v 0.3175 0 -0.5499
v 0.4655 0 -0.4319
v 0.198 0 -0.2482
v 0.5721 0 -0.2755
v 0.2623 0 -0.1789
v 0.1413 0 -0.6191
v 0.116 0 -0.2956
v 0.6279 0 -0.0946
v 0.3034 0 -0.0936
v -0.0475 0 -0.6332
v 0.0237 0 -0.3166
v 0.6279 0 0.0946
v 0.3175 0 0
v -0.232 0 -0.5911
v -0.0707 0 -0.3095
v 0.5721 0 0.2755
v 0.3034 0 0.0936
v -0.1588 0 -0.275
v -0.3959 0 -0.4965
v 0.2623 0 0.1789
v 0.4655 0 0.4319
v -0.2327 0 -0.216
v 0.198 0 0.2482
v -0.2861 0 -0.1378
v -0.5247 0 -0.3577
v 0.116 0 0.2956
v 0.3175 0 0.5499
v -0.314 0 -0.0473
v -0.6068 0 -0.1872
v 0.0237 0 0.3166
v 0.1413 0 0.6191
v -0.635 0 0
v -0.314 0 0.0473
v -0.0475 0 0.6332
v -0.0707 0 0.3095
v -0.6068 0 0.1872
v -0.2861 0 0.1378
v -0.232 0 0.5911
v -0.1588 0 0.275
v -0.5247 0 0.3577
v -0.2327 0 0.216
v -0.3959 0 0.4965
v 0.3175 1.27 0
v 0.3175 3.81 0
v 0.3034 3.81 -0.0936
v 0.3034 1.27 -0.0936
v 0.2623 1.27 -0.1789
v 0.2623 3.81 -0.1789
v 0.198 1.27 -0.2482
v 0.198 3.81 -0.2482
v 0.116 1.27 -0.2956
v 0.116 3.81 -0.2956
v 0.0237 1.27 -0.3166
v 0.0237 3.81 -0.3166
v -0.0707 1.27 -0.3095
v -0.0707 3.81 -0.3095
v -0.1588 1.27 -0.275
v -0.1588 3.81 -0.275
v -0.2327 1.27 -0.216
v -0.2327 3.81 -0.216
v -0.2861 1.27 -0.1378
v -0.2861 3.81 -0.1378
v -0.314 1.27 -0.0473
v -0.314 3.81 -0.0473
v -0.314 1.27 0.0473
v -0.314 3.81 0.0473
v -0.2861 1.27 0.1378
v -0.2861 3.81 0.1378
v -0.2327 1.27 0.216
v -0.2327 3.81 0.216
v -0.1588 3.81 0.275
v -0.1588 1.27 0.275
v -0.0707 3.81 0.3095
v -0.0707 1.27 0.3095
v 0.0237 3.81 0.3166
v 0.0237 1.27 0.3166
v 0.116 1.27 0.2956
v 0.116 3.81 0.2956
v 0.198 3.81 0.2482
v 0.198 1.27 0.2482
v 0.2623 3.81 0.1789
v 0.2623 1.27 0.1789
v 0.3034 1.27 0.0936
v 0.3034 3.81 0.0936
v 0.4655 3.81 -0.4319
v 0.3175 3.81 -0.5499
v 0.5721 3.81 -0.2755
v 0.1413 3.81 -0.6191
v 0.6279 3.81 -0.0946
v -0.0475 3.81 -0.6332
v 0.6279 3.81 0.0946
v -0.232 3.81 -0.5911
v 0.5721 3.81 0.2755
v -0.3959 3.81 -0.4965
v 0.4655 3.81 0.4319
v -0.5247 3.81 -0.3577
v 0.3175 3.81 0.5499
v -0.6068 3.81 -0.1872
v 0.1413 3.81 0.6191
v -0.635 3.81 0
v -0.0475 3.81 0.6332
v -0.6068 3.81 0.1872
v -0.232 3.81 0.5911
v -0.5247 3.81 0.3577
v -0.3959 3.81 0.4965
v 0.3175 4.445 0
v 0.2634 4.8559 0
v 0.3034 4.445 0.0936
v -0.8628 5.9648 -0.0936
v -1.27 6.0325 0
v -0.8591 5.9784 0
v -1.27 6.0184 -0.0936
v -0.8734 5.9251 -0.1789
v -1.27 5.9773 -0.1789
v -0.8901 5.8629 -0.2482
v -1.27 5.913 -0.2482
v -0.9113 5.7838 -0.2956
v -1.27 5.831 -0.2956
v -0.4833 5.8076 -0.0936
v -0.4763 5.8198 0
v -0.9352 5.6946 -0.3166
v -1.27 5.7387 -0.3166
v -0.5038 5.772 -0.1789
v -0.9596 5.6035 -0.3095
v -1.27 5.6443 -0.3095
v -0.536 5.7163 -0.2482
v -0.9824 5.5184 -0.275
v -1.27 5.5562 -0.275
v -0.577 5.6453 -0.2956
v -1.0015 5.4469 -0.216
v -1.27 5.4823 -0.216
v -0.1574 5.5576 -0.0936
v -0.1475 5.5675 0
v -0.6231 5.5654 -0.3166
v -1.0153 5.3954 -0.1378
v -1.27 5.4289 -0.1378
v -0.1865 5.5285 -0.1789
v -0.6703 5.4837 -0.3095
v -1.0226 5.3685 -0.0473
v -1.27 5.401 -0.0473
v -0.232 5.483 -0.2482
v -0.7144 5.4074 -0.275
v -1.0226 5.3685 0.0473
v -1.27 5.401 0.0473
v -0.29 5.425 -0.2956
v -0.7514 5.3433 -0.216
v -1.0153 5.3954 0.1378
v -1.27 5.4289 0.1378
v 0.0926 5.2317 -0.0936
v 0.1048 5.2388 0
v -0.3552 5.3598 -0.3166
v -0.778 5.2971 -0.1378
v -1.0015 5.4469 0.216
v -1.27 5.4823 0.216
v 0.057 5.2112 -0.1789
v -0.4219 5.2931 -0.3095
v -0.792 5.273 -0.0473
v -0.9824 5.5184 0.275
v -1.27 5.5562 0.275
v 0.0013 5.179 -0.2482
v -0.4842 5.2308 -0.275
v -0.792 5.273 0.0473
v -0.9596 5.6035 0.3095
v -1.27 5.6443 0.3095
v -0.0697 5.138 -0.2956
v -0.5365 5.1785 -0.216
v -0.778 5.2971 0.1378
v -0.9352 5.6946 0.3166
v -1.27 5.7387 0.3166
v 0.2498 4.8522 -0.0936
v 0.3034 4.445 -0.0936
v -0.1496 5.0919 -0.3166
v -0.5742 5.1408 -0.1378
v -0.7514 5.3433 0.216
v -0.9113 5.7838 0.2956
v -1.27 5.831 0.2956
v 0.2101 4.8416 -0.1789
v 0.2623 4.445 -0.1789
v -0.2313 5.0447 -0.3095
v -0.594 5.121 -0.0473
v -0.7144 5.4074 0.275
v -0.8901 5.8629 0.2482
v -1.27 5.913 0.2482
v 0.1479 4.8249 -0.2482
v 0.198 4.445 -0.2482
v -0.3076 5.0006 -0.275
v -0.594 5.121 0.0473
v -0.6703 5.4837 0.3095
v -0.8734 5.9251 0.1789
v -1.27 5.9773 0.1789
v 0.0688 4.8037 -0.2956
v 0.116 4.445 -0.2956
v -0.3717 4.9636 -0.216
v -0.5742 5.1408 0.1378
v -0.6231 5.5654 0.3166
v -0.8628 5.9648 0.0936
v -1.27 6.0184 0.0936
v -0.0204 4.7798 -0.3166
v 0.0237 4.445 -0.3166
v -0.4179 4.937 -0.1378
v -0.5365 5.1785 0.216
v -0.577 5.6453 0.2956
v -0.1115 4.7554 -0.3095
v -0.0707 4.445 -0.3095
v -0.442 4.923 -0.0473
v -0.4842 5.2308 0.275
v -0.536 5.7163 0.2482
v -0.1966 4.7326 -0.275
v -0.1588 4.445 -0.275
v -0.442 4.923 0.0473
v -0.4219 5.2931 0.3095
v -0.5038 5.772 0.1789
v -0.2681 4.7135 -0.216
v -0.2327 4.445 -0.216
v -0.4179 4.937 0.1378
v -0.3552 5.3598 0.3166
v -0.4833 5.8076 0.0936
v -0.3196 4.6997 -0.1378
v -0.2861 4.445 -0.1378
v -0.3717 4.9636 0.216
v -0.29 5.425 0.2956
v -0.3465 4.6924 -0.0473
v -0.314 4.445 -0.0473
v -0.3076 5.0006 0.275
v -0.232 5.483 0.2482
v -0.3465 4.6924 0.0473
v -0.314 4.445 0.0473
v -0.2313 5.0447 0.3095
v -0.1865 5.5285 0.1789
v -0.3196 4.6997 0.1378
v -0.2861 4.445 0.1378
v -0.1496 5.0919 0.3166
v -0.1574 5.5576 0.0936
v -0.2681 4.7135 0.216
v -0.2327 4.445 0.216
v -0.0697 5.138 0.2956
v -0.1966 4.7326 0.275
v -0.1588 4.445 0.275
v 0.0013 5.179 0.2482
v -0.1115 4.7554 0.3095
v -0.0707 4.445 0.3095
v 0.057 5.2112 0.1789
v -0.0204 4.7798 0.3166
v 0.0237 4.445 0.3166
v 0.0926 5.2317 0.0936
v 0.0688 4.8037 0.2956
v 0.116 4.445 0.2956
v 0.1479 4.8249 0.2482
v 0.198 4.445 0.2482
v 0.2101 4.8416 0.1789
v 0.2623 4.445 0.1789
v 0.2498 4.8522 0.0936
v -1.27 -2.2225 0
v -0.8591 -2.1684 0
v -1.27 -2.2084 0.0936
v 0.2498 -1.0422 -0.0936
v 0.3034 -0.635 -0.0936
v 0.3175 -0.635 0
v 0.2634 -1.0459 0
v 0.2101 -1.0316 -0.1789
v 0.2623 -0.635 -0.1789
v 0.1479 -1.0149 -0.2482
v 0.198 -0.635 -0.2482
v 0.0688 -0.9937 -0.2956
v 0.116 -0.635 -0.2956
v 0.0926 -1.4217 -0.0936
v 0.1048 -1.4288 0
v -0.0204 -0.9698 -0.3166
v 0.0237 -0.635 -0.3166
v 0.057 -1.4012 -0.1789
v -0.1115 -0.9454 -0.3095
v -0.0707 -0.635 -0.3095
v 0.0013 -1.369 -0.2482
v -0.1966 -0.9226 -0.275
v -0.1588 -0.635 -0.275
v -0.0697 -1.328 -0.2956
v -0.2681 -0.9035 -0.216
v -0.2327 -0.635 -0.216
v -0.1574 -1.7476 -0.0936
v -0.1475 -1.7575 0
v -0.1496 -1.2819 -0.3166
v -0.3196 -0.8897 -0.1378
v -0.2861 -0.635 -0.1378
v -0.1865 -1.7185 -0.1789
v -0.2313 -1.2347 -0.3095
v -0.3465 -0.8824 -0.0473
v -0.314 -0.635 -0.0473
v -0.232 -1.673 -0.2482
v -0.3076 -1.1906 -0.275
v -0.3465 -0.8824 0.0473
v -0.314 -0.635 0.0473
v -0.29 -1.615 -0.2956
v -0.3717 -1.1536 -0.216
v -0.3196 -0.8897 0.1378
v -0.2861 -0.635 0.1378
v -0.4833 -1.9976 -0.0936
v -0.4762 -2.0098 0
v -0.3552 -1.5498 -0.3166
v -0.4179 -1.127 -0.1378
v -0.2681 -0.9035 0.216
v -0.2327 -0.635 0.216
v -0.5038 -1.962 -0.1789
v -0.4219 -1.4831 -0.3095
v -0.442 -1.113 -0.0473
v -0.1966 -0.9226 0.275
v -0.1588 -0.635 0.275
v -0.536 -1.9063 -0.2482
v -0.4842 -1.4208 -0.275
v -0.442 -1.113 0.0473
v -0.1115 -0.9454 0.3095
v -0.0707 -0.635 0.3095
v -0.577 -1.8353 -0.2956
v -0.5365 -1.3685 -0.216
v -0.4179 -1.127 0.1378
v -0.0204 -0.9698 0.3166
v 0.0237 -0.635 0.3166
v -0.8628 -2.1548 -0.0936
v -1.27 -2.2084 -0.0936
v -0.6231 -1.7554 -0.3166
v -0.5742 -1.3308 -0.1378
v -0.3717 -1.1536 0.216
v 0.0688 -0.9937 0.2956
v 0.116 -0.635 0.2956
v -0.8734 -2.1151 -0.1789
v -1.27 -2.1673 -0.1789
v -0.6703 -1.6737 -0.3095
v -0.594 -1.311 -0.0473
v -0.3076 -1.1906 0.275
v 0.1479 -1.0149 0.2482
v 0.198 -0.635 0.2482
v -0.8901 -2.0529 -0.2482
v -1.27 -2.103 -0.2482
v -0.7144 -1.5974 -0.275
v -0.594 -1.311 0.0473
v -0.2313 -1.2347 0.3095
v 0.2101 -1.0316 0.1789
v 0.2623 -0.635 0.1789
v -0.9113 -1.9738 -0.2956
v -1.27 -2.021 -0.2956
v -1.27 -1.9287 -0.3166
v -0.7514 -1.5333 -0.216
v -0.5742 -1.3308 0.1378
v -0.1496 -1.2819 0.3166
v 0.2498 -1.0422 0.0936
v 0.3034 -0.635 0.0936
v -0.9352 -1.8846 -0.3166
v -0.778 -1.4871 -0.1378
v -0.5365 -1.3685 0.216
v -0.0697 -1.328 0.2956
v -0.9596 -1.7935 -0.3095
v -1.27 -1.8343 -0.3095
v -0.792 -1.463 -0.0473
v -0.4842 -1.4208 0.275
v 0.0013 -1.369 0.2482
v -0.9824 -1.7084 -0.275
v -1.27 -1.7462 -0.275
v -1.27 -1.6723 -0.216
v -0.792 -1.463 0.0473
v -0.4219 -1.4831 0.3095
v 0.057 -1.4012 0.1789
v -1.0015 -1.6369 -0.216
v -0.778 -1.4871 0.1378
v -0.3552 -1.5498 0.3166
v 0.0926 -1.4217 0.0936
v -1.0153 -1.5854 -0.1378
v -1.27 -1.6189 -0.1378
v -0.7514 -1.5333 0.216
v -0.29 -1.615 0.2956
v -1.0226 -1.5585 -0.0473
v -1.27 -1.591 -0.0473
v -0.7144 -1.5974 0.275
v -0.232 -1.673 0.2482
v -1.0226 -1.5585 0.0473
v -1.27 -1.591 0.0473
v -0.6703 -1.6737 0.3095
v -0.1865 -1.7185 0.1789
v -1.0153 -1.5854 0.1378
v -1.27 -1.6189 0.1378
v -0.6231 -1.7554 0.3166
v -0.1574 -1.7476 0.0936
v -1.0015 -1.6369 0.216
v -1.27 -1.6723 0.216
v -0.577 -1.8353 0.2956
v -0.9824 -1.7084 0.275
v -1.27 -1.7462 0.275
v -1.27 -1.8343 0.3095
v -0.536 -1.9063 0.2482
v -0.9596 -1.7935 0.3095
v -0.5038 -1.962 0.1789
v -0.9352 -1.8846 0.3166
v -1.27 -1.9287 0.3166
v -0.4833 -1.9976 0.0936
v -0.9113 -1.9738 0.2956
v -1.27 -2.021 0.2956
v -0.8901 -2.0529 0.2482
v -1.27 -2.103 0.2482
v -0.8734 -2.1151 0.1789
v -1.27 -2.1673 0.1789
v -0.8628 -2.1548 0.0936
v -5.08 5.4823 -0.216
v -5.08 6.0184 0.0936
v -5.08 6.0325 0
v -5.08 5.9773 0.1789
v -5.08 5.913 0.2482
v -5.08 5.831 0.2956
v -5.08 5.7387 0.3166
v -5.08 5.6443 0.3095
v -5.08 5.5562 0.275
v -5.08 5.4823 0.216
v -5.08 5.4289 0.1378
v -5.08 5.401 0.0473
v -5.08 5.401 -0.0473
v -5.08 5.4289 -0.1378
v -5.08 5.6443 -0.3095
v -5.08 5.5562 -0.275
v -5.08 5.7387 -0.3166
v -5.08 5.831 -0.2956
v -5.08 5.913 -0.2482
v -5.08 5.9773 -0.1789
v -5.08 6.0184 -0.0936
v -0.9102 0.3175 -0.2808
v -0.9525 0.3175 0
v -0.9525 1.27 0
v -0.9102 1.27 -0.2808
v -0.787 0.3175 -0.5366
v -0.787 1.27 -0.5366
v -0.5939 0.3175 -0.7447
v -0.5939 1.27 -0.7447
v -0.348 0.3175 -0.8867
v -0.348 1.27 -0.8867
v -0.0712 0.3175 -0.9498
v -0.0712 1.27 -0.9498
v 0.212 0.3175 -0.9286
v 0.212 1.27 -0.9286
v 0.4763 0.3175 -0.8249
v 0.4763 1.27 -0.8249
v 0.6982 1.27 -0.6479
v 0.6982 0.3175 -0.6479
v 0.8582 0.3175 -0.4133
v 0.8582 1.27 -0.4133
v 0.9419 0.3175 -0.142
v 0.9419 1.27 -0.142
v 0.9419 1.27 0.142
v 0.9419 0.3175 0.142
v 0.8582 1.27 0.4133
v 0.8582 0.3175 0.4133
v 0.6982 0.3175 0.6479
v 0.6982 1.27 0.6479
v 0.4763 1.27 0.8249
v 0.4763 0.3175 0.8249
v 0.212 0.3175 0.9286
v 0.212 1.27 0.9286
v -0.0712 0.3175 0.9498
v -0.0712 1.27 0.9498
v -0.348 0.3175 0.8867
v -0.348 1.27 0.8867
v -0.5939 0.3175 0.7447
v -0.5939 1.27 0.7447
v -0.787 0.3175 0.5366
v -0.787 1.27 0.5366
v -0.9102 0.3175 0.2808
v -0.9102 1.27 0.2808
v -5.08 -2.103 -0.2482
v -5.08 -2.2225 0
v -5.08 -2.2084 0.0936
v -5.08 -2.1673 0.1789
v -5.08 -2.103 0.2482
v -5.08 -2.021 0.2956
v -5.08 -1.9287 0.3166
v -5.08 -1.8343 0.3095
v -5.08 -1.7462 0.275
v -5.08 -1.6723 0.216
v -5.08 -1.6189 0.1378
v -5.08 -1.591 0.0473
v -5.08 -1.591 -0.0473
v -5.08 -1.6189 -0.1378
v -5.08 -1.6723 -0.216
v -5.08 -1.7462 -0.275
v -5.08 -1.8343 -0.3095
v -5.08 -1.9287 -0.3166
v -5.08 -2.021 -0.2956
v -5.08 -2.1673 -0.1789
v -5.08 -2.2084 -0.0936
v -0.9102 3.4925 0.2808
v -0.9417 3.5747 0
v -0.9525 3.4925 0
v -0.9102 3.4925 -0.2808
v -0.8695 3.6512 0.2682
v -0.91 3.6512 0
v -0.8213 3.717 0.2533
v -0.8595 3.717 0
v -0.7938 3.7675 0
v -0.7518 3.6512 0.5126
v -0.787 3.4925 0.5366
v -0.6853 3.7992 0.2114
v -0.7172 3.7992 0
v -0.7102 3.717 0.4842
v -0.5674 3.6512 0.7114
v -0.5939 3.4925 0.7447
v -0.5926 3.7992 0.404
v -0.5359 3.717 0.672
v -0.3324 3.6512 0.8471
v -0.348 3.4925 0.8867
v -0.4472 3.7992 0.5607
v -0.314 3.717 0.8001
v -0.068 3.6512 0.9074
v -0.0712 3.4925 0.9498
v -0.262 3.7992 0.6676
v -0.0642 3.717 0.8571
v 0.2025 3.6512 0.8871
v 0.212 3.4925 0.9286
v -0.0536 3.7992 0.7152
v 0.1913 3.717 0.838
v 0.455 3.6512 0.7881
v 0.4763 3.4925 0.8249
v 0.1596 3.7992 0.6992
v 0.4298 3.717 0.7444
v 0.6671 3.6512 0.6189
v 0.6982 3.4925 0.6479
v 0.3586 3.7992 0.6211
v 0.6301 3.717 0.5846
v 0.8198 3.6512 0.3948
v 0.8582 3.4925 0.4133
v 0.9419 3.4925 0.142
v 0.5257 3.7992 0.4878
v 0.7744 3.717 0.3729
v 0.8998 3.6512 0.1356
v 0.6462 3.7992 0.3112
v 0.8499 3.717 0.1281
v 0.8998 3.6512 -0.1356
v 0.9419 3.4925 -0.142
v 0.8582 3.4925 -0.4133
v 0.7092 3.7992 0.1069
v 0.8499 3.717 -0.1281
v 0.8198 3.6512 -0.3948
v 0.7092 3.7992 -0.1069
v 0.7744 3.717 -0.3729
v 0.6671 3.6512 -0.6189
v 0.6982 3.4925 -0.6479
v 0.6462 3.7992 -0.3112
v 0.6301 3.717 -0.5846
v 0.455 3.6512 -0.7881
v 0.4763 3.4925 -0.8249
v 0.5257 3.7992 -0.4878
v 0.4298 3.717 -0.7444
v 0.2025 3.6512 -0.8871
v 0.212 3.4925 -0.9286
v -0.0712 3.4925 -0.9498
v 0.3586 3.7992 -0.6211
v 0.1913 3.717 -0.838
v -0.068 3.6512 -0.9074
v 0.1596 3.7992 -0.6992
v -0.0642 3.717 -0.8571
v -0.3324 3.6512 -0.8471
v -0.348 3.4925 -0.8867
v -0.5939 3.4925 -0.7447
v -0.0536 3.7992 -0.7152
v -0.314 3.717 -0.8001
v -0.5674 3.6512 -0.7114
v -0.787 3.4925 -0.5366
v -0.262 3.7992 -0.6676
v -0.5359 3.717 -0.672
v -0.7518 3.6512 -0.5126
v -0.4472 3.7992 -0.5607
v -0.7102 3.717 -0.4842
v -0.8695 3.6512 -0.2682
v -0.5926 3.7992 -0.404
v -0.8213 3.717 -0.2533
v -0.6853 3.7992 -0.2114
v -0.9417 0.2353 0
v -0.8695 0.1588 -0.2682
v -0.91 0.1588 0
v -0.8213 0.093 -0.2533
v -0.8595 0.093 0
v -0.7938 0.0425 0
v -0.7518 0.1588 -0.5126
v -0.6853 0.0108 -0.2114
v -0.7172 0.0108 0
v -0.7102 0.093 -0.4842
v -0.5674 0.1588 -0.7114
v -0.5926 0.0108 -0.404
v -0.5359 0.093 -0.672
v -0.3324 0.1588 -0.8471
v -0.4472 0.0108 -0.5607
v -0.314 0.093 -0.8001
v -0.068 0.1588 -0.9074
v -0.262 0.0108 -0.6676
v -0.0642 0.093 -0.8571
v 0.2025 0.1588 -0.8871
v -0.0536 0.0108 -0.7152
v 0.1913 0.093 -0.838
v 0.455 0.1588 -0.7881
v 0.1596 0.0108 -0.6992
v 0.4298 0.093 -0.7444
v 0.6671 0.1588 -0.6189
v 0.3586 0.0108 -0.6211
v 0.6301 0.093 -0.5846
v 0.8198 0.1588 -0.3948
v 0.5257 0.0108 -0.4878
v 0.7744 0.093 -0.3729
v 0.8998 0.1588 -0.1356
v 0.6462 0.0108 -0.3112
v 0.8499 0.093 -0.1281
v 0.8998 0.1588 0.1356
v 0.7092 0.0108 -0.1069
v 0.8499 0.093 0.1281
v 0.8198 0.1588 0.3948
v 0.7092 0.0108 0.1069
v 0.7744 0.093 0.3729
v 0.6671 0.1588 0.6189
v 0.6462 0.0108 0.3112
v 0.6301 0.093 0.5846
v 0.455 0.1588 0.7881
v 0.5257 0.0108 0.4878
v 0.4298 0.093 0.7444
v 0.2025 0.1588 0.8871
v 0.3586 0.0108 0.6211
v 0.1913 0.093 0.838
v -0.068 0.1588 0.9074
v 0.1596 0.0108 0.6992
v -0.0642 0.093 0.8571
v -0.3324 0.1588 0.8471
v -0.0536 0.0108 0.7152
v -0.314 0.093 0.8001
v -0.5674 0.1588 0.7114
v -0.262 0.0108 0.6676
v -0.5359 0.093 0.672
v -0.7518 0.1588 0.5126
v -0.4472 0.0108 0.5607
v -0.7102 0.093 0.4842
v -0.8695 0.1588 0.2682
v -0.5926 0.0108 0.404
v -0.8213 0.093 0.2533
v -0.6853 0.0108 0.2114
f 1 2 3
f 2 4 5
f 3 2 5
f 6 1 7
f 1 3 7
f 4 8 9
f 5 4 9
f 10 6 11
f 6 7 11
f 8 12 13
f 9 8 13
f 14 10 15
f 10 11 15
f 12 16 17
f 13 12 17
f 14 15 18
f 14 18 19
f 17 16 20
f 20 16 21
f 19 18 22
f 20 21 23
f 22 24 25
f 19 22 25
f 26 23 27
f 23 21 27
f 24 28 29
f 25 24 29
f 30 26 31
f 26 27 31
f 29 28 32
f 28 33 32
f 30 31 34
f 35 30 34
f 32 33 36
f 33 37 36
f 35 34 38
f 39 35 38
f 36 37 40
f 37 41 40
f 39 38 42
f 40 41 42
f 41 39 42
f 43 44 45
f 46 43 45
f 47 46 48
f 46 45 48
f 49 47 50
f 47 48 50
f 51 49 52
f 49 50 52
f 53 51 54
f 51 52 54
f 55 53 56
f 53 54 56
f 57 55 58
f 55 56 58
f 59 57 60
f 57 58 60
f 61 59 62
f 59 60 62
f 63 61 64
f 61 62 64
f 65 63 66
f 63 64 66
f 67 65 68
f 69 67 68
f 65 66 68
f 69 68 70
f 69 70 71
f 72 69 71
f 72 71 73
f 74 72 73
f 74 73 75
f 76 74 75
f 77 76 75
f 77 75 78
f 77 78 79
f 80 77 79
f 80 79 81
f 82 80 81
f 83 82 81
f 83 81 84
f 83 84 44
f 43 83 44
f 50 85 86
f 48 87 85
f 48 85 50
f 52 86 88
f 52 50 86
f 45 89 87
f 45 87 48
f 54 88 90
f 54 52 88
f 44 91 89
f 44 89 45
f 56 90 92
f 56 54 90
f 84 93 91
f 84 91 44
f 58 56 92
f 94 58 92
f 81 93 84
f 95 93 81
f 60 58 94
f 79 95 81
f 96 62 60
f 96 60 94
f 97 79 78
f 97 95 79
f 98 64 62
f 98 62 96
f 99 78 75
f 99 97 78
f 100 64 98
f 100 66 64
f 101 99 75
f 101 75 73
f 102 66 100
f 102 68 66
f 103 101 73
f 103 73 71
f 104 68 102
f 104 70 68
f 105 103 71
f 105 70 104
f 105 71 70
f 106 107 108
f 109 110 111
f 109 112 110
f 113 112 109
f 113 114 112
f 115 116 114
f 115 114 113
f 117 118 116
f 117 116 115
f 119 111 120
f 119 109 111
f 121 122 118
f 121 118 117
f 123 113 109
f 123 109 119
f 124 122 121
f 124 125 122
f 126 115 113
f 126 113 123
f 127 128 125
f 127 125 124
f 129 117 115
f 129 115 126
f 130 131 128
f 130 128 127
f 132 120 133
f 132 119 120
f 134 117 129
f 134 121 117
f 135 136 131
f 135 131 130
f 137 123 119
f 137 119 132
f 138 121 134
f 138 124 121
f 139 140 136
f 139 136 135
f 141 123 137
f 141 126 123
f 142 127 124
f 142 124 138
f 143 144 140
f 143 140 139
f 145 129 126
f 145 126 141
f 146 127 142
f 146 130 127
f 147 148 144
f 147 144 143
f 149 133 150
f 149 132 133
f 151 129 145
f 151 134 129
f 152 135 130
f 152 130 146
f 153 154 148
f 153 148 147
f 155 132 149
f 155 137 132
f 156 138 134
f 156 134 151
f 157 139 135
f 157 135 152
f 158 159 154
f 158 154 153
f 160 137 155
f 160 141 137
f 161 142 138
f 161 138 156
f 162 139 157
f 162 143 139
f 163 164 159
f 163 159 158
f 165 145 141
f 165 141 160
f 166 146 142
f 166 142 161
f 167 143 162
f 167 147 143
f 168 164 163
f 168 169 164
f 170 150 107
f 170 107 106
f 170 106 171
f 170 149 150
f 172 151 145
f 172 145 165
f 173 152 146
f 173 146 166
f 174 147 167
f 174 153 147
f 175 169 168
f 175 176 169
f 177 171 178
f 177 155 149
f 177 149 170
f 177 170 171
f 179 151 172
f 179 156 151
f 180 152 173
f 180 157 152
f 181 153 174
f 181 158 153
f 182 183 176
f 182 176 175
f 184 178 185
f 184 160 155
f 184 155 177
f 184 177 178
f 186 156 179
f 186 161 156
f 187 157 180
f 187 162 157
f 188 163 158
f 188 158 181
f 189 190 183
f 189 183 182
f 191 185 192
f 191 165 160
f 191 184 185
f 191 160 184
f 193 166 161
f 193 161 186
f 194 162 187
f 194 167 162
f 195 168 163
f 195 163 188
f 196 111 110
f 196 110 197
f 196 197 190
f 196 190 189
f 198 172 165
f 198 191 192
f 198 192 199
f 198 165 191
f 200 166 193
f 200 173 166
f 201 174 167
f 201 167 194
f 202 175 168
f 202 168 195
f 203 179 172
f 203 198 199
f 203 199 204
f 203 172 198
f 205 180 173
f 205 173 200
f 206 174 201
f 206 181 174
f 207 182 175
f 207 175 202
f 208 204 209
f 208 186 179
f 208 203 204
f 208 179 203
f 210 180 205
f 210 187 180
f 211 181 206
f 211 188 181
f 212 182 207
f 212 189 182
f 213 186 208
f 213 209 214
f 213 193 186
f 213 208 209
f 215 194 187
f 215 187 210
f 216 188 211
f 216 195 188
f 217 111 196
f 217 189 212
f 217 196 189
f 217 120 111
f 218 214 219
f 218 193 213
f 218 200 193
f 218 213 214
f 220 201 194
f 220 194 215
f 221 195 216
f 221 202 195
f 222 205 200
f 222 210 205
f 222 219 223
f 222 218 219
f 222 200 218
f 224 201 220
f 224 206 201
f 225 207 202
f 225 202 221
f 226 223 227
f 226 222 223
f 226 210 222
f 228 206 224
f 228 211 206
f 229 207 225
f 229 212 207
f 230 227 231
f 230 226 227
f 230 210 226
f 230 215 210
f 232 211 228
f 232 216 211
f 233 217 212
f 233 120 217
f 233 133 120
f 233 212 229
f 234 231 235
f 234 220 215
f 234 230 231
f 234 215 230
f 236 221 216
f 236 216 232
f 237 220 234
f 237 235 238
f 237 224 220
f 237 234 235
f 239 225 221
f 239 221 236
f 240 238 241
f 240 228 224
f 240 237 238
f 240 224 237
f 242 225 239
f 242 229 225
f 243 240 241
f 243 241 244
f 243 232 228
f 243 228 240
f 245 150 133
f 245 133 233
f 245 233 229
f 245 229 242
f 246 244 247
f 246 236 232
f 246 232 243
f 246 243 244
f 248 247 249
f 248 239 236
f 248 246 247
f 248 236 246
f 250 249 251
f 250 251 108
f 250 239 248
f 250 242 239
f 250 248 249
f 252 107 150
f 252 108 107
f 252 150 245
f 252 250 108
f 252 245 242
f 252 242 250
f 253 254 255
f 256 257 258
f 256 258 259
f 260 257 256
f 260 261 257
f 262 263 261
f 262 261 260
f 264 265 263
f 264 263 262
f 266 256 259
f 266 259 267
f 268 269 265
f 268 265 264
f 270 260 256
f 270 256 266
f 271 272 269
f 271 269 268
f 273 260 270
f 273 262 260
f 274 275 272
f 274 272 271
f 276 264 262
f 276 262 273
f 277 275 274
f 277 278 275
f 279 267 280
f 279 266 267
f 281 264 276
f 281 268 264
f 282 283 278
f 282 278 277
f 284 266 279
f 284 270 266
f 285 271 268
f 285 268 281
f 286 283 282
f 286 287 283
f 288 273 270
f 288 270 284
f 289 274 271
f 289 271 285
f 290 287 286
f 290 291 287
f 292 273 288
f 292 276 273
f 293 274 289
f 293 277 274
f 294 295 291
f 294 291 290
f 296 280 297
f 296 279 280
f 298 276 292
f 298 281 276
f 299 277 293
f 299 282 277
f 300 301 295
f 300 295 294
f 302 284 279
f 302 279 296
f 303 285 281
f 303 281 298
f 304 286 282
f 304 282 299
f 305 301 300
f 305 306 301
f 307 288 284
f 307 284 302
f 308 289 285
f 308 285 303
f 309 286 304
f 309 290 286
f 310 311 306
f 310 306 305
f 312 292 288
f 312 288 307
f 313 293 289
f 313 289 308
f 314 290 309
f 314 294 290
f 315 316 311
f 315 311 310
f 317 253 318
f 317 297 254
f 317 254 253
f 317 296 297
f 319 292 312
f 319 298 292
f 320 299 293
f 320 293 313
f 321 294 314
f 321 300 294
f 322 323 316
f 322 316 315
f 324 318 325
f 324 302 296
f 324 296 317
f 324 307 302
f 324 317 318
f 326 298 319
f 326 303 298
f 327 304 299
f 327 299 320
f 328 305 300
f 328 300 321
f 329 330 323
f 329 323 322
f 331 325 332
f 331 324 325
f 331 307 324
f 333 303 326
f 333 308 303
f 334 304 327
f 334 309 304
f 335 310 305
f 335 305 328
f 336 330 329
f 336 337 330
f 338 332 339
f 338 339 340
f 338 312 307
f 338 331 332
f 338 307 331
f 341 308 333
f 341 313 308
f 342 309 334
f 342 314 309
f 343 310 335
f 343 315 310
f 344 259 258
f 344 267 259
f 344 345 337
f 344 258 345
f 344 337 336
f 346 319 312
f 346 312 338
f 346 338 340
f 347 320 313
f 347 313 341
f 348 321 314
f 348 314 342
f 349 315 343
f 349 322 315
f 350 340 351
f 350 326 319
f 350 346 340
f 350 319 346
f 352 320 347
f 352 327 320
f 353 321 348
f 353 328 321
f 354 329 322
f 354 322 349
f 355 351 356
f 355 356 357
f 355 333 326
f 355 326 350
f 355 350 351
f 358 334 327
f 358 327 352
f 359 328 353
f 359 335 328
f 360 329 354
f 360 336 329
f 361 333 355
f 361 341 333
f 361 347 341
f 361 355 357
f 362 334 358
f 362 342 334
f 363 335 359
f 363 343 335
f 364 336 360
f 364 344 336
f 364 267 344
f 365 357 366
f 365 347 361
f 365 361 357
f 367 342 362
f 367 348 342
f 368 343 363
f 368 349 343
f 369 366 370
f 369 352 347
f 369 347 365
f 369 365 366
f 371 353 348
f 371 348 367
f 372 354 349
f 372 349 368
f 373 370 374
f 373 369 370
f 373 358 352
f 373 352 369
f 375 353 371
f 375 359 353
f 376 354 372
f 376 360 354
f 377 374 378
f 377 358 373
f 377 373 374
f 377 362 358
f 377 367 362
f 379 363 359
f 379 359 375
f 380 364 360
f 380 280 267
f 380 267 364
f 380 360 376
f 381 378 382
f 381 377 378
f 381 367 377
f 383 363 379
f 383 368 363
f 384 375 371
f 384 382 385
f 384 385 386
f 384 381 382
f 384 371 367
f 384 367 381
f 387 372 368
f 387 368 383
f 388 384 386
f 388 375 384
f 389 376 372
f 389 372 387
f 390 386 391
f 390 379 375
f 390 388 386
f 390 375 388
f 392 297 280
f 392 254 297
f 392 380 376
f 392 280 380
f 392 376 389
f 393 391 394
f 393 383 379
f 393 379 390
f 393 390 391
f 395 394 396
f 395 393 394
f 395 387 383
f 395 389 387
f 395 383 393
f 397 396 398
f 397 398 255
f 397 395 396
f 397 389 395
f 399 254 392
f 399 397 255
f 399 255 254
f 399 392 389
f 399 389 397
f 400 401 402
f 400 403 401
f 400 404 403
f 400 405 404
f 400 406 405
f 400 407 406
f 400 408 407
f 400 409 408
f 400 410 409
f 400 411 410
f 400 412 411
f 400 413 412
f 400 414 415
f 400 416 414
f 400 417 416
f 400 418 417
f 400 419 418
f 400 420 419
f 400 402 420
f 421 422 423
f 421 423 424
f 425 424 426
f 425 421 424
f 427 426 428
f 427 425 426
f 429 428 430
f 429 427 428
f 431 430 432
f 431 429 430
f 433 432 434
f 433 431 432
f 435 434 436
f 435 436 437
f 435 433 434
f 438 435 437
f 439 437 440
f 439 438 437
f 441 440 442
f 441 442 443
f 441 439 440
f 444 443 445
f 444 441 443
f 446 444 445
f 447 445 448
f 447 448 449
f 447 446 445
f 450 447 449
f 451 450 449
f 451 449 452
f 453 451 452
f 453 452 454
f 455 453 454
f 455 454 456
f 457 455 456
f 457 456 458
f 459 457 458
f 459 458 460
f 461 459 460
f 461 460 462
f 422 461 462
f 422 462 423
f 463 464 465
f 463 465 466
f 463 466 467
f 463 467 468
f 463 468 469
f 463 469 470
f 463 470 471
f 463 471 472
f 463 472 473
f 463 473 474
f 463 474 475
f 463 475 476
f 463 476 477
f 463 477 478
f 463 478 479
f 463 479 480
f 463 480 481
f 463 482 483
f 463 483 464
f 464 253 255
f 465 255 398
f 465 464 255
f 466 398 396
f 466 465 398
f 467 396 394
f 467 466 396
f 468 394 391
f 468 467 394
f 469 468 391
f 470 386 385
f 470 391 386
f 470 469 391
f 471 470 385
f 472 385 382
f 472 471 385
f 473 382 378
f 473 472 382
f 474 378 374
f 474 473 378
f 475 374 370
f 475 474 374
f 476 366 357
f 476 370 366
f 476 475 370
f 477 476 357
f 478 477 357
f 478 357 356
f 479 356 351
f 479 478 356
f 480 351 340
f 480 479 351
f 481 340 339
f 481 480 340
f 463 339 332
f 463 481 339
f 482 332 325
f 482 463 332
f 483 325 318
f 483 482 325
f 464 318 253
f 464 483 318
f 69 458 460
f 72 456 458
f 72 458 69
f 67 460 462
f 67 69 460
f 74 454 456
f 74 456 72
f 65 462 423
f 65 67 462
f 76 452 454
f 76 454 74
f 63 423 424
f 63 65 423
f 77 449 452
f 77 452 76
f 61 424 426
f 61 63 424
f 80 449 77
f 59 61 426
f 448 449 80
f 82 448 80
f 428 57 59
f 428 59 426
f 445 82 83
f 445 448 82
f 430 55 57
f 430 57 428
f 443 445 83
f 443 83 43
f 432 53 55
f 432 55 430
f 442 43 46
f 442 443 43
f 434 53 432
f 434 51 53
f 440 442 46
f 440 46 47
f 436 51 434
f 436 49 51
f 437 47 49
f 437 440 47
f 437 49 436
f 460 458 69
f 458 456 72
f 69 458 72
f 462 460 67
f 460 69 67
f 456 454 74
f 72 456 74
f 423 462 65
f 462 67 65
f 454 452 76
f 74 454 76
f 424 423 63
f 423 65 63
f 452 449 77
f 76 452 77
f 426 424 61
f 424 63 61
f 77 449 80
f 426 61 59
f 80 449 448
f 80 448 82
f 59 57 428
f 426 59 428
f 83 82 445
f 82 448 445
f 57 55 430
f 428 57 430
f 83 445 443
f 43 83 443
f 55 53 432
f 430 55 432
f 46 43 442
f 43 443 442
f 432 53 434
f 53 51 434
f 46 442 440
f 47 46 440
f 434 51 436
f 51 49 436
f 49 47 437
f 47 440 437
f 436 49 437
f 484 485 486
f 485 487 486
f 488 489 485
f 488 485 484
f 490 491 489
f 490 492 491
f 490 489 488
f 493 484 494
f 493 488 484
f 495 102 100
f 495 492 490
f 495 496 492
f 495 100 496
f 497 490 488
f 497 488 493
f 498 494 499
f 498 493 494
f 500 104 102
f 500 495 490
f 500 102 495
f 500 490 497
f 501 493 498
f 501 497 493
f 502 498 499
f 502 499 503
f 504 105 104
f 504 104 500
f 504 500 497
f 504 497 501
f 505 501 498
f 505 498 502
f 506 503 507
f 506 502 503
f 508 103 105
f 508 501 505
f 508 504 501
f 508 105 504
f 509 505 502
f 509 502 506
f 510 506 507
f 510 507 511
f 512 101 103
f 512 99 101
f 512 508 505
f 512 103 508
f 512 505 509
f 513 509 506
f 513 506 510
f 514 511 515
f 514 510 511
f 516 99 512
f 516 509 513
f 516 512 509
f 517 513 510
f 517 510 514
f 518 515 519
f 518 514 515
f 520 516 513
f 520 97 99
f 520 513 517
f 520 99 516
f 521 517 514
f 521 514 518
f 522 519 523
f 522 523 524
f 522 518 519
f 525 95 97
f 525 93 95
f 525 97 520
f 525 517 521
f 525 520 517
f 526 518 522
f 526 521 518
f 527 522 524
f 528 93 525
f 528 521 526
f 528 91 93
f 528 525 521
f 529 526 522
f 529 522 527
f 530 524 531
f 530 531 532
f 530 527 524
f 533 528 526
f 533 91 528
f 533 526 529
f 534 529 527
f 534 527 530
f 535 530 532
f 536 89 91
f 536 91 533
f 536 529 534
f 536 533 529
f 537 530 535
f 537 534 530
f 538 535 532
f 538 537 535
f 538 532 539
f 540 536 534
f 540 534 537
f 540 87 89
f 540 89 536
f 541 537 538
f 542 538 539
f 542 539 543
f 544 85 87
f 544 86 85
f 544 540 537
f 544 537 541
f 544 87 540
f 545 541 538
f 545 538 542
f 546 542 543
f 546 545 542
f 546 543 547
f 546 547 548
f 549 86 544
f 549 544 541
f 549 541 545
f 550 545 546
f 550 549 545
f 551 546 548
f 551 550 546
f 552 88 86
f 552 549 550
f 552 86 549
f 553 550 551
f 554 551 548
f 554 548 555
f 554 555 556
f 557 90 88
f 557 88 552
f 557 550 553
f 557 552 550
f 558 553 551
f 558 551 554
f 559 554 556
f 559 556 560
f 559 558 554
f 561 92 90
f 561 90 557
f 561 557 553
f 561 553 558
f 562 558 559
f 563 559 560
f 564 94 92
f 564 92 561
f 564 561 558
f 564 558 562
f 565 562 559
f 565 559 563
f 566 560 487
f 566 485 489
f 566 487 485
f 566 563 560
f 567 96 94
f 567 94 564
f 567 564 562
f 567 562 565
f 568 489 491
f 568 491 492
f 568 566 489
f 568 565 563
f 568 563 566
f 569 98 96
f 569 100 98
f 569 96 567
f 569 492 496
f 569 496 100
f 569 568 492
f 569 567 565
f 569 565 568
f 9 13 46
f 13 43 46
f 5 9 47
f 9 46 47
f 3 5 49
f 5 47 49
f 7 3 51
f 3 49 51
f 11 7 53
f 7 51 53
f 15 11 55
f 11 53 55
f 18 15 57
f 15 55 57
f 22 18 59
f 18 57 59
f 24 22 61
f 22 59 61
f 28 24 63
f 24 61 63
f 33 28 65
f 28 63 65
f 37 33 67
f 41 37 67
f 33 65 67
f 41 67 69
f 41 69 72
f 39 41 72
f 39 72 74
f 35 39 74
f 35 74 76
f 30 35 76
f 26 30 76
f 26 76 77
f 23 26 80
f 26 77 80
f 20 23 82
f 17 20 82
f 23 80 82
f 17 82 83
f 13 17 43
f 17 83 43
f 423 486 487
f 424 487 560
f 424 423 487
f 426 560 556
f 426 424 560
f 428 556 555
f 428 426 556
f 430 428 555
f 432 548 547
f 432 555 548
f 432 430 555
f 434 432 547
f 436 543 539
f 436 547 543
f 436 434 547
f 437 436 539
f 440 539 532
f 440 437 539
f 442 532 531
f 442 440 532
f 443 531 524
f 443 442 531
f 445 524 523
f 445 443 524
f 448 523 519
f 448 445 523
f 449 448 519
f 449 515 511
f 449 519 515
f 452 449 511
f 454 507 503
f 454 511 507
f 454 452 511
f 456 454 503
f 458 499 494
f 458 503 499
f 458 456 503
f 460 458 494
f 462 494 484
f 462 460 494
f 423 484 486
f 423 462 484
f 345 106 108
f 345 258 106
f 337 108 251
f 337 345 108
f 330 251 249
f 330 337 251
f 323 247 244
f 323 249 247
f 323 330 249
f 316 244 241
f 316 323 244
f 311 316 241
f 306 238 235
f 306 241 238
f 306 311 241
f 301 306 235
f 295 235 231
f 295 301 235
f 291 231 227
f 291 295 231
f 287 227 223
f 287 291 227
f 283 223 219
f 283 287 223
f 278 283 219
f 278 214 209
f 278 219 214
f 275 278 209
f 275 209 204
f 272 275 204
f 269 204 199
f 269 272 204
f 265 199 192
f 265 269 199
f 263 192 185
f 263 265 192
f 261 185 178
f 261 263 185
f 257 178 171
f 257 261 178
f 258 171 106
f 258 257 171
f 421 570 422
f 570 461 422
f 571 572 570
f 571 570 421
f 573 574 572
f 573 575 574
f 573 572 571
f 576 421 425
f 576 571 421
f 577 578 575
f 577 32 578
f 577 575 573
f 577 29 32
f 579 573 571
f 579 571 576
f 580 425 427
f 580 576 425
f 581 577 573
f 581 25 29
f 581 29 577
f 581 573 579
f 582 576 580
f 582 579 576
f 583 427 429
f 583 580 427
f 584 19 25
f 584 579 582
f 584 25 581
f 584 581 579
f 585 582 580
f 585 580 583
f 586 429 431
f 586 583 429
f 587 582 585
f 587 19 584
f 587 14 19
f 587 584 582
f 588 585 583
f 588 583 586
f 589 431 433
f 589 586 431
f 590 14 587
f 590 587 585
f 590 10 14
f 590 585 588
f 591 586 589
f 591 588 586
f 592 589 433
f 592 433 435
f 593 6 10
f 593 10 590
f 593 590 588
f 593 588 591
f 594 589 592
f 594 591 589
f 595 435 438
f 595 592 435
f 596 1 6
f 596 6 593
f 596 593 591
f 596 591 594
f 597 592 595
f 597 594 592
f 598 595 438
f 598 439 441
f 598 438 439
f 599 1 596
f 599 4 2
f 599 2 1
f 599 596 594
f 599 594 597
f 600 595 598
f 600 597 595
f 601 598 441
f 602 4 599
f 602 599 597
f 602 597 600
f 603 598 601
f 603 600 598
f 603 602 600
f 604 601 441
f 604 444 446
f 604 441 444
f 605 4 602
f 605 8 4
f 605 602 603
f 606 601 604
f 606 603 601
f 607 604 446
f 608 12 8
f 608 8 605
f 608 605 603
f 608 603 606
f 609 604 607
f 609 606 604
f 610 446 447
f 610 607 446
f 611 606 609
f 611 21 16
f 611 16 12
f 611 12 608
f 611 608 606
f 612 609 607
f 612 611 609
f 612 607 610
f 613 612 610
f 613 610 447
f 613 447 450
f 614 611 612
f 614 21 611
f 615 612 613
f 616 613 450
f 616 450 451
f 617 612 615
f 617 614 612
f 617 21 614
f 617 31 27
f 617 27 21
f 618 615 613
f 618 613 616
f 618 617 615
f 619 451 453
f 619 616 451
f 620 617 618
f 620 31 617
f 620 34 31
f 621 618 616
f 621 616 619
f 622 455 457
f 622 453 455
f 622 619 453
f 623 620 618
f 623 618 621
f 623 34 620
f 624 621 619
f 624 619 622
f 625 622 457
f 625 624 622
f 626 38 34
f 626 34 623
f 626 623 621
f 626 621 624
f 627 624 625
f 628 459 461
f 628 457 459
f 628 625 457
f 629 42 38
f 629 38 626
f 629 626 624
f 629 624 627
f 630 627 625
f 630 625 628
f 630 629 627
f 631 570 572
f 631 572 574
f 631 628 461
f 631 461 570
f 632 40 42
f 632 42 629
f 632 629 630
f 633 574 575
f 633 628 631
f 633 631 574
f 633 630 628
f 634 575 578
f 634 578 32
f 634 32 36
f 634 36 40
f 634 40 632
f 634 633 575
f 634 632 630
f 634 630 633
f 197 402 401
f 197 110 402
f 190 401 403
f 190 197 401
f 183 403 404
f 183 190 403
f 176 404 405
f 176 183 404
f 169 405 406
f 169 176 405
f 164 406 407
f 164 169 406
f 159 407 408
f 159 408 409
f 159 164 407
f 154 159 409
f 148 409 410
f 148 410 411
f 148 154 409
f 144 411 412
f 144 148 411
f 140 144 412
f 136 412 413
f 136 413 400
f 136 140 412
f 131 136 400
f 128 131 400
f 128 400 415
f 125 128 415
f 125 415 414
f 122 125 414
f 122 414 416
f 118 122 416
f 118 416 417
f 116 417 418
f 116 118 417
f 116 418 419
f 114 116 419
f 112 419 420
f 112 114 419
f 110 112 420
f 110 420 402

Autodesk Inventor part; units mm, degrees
sketch "Náčrt1" plane through (0, 0, 0) normal (0, 1, 0) x (-1, 0, 0)
  circle A0 centre (0, 0) radius 0.9525
  dimension "d0" = 1.905
extrude "Vysunutí1" add sketch "Náčrt1" along normal blind 3.81
fillet "Zaoblení1" radius 0.3175 2 edges at (0.9525, 3.81, 0) (0.9525, 0, 0)
ref_plane "Pracovní rovina1" through (0, 1.27, 0) normal (0, -1, 0) x (1, 0, 0)
sketch "Náčrt2" plane through (0, 3.81, 0) normal (0, 1, 0) x (1, 0, 0)
  circle A0 centre (0, 0) radius 0.635 projected
  circle A1 centre (0, 0) radius 0.3175
  dimension "d5" = 0.635
extrude "Vysunutí2" cut sketch "Náčrt2" against normal up to next contours A1
split body "Rozdělit1" result two bodies by plane through (0, 1.27, 0) normal (0, -1, 0) first body at (-0.4466, 0.9525, 0.0726)
sketch "Náčrt3" plane through (0, 3.81, 0) normal (0, 1, 0) x (1, 0, 0)
  circle A0 centre (0, 0) radius 0.3175 projected
extrude "Vysunutí3" add sketch "Náčrt3" along normal blind 5.08 bodies 3
ref_plane "Pracovní rovina2" through (0, 3.81, 0) normal (0, 1, 0) x (1, 0, 0)
split body "Rozdělit2" result two bodies by plane through (0, 3.81, 0) normal (0, 1, 0) bodies 3 first body at (-0.1819, 7.1967, -0.0147)
move or copy body "Posunout těleso1" bodies to move or copy 4 copy no translate (0, -4.445, 0)
ref_plane "Pracovní rovina3" through (0.3175, 4.445, 0) normal (0, 0, -1) x (-1, 0, 0)
sketch "Náčrt5" plane through (0.3175, 4.445, 0) normal (0, 0, -1) x (-1, 0, 0)
  line L0 (0.635, 0) -> (0, 0) projected
  line L1 (1.5875, 1.27) -> (5.3975, 1.27)
  line L2 (0, -5.08) -> (0.635, -5.08) projected
  line L3 (1.5875, -6.35) -> (5.3975, -6.35)
  arc A0 (1.5875, 1.27) -> (0.3175, 0) centre (1.5875, 0) ccw
  line L4 (0.3175, 0) -> (1.5875, 1.27) construction
  line L5 (0.3175, 0) -> (2.1136, 0) construction
  arc A1 (0.3175, -5.08) -> (1.5875, -6.35) centre (1.5875, -5.08) ccw
  point P0 (0.3175, -4.445)
  dimension "d18" = 45
  dimension "d19" = 1.27
  dimension "d20" = 1.27
sketch "Náčrt6" plane through (0, -0.635, 0) normal (0, -1, 0) x (1, 0, 0)
  circle A0 centre (0, 0) radius 0.3175 projected
sketch "Náčrt7" plane through (0, 4.445, 0) normal (0, 1, 0) x (1, 0, 0)
  circle A0 centre (0, 0) radius 0.3175 projected
sweep "Tažení1" add profiles "Náčrt7" path "Náčrt5" bodies 4 path curves A0 L1
sweep "Tažení2" add profiles "Náčrt6" path "Náčrt5" bodies 4 path curves A1 L3
properties part number "Diode" material "SAN plast"
